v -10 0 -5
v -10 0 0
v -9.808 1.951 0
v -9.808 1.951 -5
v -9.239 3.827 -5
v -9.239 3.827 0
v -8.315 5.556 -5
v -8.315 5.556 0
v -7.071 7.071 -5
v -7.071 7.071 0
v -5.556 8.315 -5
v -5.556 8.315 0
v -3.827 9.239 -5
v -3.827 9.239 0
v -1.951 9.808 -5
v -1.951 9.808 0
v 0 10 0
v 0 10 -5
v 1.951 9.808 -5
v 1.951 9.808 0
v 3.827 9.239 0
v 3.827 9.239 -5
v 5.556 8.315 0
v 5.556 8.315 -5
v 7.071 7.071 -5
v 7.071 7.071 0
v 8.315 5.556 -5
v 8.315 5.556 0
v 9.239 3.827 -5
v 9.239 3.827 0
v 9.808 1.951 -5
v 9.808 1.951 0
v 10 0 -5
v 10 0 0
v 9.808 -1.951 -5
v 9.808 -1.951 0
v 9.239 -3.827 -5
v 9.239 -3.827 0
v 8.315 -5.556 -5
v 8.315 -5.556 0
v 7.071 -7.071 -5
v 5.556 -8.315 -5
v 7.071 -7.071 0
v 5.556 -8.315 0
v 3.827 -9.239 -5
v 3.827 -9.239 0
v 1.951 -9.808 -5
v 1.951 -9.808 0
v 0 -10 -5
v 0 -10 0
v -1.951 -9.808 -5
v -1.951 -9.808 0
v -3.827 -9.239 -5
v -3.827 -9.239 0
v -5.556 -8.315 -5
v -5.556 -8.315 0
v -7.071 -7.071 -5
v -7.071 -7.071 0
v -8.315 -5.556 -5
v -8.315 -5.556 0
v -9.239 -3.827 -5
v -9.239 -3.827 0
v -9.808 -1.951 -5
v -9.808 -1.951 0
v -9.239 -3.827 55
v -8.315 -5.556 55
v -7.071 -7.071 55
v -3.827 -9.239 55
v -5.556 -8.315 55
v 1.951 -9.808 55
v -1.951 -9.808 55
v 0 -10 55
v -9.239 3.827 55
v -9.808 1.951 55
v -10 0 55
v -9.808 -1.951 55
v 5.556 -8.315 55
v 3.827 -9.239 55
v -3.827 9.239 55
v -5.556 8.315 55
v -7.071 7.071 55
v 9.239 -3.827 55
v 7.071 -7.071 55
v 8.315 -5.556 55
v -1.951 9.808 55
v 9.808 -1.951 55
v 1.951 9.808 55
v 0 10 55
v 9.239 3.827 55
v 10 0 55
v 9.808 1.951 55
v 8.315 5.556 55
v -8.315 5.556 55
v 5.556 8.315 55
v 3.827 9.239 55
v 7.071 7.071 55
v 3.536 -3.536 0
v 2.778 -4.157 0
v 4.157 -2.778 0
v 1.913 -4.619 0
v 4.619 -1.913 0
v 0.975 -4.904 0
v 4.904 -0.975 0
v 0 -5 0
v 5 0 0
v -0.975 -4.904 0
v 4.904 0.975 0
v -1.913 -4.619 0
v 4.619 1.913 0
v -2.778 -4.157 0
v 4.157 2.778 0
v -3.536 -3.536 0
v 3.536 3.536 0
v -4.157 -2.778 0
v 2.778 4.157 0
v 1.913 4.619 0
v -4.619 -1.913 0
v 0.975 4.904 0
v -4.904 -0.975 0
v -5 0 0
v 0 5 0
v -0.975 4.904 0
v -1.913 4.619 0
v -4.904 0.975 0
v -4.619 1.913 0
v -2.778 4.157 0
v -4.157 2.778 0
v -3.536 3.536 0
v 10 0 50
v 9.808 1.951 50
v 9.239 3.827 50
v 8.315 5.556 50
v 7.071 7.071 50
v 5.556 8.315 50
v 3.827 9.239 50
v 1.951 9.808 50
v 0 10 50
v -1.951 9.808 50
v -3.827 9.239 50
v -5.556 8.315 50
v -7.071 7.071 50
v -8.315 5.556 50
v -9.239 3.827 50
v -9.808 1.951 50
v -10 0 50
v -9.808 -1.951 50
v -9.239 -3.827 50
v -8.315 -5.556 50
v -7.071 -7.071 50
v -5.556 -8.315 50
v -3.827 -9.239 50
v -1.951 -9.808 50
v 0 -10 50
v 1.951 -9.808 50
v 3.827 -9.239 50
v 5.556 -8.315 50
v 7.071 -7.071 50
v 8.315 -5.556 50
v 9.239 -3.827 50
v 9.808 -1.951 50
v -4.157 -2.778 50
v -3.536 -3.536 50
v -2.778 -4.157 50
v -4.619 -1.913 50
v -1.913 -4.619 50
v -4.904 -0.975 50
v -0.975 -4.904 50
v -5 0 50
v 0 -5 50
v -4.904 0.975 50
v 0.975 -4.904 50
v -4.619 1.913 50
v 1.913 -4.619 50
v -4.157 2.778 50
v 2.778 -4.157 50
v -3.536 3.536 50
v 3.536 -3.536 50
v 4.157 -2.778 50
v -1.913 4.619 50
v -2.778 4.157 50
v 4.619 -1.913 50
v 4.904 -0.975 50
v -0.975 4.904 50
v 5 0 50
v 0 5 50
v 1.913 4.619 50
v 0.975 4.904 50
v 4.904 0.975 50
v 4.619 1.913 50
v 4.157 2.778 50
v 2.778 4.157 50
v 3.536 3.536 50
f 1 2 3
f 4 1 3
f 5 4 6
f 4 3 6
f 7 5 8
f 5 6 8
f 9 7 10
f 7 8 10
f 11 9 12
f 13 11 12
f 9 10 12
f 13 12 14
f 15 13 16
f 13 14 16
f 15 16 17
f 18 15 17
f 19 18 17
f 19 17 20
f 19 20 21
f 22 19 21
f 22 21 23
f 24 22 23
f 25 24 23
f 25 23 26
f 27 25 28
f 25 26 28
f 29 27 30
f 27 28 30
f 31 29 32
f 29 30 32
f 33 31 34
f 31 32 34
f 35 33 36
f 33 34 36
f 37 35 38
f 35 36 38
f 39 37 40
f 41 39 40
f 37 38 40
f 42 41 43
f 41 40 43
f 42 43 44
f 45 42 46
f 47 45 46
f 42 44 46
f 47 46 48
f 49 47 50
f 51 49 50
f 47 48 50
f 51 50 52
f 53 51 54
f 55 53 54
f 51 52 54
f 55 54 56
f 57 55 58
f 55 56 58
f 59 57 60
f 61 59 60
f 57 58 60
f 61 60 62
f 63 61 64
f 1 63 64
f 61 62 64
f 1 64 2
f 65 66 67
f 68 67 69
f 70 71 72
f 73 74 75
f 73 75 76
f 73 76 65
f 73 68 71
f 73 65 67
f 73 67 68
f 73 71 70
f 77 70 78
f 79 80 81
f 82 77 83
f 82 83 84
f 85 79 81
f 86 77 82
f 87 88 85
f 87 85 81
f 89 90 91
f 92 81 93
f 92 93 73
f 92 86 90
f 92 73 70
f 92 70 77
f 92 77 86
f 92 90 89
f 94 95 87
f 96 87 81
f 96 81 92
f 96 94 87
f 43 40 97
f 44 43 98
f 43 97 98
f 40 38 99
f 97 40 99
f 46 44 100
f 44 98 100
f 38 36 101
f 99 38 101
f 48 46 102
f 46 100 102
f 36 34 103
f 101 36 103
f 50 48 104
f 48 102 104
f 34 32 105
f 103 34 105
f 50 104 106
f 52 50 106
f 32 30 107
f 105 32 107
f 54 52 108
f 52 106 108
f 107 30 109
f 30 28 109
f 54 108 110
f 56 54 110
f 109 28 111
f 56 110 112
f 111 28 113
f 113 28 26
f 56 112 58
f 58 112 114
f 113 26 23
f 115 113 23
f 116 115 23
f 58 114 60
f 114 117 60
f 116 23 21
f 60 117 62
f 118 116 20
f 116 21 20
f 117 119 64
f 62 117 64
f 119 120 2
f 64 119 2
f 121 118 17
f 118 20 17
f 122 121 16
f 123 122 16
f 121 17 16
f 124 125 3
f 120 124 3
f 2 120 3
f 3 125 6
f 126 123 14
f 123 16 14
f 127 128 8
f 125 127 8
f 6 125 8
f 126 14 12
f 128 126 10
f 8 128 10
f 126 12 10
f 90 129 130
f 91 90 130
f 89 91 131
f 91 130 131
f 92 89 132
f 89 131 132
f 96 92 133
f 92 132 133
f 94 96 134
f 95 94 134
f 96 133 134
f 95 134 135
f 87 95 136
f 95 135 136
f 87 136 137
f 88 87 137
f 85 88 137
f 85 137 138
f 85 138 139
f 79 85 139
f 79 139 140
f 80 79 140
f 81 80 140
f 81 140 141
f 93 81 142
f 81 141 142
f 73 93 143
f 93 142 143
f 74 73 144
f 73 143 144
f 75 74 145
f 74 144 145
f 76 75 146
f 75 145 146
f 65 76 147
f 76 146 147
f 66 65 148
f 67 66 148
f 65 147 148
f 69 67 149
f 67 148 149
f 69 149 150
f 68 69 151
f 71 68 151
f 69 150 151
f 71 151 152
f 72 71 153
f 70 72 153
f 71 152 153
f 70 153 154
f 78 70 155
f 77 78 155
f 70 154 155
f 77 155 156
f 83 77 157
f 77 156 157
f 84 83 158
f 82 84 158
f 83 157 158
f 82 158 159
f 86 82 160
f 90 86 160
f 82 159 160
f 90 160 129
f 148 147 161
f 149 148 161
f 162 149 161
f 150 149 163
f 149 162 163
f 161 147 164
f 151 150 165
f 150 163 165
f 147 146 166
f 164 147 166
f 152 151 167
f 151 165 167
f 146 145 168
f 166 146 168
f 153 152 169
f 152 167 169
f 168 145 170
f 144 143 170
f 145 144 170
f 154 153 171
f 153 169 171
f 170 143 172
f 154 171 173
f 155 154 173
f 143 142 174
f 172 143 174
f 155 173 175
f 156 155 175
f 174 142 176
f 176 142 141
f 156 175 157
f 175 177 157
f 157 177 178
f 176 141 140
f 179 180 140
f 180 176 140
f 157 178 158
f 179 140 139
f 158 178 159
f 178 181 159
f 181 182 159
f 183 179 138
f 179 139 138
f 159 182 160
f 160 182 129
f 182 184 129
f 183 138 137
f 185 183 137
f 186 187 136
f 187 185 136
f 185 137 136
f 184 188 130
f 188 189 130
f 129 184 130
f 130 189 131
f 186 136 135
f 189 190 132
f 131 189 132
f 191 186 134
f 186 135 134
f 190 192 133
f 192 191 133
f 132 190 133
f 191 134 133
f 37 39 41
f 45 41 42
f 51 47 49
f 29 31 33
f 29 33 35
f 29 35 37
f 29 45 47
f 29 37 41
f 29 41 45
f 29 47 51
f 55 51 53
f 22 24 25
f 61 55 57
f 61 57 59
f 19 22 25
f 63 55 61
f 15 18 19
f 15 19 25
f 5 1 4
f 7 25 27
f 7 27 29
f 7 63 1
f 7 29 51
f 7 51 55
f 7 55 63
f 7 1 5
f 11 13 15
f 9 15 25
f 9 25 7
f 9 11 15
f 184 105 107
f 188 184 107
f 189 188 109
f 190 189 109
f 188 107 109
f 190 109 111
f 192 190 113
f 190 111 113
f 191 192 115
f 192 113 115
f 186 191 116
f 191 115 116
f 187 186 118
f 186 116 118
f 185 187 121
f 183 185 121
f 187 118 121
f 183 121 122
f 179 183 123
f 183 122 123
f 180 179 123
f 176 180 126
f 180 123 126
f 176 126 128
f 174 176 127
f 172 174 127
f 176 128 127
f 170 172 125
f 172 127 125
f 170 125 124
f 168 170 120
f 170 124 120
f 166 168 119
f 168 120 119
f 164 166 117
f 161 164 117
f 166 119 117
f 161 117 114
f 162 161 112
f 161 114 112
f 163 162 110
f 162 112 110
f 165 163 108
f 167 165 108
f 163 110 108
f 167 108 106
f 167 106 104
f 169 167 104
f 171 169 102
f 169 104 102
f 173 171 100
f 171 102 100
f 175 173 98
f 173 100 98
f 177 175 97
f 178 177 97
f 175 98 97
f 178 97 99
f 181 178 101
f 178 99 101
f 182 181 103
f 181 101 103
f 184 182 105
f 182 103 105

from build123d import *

# Parameters (mm, degrees)
SKETCH2_R           = 5
BOSS_EXTRUDE1_DEPTH = 50
SKETCH3_R           = 10
BOSS_EXTRUDE2_DEPTH = 5
SKETCH4_R           = 10
BOSS_EXTRUDE3_DEPTH = 5


with BuildPart() as part:
    # Sketch2 → Boss-Extrude1 (new body)
    with BuildSketch(Plane.XY):
        Circle(SKETCH2_R)
    extrude(amount=BOSS_EXTRUDE1_DEPTH)

    # Sketch3 → Boss-Extrude2 (add)
    with BuildSketch(Plane(origin=(0, 0, 0), x_dir=(-1, 0, 0), z_dir=(0, 0, -1))):
        Circle(SKETCH3_R)
    extrude(amount=BOSS_EXTRUDE2_DEPTH)

    # Sketch4 → Boss-Extrude3 (add)
    with BuildSketch(Plane.XY.offset(50)):
        Circle(SKETCH4_R)
    extrude(amount=BOSS_EXTRUDE3_DEPTH)


solid = part.part
